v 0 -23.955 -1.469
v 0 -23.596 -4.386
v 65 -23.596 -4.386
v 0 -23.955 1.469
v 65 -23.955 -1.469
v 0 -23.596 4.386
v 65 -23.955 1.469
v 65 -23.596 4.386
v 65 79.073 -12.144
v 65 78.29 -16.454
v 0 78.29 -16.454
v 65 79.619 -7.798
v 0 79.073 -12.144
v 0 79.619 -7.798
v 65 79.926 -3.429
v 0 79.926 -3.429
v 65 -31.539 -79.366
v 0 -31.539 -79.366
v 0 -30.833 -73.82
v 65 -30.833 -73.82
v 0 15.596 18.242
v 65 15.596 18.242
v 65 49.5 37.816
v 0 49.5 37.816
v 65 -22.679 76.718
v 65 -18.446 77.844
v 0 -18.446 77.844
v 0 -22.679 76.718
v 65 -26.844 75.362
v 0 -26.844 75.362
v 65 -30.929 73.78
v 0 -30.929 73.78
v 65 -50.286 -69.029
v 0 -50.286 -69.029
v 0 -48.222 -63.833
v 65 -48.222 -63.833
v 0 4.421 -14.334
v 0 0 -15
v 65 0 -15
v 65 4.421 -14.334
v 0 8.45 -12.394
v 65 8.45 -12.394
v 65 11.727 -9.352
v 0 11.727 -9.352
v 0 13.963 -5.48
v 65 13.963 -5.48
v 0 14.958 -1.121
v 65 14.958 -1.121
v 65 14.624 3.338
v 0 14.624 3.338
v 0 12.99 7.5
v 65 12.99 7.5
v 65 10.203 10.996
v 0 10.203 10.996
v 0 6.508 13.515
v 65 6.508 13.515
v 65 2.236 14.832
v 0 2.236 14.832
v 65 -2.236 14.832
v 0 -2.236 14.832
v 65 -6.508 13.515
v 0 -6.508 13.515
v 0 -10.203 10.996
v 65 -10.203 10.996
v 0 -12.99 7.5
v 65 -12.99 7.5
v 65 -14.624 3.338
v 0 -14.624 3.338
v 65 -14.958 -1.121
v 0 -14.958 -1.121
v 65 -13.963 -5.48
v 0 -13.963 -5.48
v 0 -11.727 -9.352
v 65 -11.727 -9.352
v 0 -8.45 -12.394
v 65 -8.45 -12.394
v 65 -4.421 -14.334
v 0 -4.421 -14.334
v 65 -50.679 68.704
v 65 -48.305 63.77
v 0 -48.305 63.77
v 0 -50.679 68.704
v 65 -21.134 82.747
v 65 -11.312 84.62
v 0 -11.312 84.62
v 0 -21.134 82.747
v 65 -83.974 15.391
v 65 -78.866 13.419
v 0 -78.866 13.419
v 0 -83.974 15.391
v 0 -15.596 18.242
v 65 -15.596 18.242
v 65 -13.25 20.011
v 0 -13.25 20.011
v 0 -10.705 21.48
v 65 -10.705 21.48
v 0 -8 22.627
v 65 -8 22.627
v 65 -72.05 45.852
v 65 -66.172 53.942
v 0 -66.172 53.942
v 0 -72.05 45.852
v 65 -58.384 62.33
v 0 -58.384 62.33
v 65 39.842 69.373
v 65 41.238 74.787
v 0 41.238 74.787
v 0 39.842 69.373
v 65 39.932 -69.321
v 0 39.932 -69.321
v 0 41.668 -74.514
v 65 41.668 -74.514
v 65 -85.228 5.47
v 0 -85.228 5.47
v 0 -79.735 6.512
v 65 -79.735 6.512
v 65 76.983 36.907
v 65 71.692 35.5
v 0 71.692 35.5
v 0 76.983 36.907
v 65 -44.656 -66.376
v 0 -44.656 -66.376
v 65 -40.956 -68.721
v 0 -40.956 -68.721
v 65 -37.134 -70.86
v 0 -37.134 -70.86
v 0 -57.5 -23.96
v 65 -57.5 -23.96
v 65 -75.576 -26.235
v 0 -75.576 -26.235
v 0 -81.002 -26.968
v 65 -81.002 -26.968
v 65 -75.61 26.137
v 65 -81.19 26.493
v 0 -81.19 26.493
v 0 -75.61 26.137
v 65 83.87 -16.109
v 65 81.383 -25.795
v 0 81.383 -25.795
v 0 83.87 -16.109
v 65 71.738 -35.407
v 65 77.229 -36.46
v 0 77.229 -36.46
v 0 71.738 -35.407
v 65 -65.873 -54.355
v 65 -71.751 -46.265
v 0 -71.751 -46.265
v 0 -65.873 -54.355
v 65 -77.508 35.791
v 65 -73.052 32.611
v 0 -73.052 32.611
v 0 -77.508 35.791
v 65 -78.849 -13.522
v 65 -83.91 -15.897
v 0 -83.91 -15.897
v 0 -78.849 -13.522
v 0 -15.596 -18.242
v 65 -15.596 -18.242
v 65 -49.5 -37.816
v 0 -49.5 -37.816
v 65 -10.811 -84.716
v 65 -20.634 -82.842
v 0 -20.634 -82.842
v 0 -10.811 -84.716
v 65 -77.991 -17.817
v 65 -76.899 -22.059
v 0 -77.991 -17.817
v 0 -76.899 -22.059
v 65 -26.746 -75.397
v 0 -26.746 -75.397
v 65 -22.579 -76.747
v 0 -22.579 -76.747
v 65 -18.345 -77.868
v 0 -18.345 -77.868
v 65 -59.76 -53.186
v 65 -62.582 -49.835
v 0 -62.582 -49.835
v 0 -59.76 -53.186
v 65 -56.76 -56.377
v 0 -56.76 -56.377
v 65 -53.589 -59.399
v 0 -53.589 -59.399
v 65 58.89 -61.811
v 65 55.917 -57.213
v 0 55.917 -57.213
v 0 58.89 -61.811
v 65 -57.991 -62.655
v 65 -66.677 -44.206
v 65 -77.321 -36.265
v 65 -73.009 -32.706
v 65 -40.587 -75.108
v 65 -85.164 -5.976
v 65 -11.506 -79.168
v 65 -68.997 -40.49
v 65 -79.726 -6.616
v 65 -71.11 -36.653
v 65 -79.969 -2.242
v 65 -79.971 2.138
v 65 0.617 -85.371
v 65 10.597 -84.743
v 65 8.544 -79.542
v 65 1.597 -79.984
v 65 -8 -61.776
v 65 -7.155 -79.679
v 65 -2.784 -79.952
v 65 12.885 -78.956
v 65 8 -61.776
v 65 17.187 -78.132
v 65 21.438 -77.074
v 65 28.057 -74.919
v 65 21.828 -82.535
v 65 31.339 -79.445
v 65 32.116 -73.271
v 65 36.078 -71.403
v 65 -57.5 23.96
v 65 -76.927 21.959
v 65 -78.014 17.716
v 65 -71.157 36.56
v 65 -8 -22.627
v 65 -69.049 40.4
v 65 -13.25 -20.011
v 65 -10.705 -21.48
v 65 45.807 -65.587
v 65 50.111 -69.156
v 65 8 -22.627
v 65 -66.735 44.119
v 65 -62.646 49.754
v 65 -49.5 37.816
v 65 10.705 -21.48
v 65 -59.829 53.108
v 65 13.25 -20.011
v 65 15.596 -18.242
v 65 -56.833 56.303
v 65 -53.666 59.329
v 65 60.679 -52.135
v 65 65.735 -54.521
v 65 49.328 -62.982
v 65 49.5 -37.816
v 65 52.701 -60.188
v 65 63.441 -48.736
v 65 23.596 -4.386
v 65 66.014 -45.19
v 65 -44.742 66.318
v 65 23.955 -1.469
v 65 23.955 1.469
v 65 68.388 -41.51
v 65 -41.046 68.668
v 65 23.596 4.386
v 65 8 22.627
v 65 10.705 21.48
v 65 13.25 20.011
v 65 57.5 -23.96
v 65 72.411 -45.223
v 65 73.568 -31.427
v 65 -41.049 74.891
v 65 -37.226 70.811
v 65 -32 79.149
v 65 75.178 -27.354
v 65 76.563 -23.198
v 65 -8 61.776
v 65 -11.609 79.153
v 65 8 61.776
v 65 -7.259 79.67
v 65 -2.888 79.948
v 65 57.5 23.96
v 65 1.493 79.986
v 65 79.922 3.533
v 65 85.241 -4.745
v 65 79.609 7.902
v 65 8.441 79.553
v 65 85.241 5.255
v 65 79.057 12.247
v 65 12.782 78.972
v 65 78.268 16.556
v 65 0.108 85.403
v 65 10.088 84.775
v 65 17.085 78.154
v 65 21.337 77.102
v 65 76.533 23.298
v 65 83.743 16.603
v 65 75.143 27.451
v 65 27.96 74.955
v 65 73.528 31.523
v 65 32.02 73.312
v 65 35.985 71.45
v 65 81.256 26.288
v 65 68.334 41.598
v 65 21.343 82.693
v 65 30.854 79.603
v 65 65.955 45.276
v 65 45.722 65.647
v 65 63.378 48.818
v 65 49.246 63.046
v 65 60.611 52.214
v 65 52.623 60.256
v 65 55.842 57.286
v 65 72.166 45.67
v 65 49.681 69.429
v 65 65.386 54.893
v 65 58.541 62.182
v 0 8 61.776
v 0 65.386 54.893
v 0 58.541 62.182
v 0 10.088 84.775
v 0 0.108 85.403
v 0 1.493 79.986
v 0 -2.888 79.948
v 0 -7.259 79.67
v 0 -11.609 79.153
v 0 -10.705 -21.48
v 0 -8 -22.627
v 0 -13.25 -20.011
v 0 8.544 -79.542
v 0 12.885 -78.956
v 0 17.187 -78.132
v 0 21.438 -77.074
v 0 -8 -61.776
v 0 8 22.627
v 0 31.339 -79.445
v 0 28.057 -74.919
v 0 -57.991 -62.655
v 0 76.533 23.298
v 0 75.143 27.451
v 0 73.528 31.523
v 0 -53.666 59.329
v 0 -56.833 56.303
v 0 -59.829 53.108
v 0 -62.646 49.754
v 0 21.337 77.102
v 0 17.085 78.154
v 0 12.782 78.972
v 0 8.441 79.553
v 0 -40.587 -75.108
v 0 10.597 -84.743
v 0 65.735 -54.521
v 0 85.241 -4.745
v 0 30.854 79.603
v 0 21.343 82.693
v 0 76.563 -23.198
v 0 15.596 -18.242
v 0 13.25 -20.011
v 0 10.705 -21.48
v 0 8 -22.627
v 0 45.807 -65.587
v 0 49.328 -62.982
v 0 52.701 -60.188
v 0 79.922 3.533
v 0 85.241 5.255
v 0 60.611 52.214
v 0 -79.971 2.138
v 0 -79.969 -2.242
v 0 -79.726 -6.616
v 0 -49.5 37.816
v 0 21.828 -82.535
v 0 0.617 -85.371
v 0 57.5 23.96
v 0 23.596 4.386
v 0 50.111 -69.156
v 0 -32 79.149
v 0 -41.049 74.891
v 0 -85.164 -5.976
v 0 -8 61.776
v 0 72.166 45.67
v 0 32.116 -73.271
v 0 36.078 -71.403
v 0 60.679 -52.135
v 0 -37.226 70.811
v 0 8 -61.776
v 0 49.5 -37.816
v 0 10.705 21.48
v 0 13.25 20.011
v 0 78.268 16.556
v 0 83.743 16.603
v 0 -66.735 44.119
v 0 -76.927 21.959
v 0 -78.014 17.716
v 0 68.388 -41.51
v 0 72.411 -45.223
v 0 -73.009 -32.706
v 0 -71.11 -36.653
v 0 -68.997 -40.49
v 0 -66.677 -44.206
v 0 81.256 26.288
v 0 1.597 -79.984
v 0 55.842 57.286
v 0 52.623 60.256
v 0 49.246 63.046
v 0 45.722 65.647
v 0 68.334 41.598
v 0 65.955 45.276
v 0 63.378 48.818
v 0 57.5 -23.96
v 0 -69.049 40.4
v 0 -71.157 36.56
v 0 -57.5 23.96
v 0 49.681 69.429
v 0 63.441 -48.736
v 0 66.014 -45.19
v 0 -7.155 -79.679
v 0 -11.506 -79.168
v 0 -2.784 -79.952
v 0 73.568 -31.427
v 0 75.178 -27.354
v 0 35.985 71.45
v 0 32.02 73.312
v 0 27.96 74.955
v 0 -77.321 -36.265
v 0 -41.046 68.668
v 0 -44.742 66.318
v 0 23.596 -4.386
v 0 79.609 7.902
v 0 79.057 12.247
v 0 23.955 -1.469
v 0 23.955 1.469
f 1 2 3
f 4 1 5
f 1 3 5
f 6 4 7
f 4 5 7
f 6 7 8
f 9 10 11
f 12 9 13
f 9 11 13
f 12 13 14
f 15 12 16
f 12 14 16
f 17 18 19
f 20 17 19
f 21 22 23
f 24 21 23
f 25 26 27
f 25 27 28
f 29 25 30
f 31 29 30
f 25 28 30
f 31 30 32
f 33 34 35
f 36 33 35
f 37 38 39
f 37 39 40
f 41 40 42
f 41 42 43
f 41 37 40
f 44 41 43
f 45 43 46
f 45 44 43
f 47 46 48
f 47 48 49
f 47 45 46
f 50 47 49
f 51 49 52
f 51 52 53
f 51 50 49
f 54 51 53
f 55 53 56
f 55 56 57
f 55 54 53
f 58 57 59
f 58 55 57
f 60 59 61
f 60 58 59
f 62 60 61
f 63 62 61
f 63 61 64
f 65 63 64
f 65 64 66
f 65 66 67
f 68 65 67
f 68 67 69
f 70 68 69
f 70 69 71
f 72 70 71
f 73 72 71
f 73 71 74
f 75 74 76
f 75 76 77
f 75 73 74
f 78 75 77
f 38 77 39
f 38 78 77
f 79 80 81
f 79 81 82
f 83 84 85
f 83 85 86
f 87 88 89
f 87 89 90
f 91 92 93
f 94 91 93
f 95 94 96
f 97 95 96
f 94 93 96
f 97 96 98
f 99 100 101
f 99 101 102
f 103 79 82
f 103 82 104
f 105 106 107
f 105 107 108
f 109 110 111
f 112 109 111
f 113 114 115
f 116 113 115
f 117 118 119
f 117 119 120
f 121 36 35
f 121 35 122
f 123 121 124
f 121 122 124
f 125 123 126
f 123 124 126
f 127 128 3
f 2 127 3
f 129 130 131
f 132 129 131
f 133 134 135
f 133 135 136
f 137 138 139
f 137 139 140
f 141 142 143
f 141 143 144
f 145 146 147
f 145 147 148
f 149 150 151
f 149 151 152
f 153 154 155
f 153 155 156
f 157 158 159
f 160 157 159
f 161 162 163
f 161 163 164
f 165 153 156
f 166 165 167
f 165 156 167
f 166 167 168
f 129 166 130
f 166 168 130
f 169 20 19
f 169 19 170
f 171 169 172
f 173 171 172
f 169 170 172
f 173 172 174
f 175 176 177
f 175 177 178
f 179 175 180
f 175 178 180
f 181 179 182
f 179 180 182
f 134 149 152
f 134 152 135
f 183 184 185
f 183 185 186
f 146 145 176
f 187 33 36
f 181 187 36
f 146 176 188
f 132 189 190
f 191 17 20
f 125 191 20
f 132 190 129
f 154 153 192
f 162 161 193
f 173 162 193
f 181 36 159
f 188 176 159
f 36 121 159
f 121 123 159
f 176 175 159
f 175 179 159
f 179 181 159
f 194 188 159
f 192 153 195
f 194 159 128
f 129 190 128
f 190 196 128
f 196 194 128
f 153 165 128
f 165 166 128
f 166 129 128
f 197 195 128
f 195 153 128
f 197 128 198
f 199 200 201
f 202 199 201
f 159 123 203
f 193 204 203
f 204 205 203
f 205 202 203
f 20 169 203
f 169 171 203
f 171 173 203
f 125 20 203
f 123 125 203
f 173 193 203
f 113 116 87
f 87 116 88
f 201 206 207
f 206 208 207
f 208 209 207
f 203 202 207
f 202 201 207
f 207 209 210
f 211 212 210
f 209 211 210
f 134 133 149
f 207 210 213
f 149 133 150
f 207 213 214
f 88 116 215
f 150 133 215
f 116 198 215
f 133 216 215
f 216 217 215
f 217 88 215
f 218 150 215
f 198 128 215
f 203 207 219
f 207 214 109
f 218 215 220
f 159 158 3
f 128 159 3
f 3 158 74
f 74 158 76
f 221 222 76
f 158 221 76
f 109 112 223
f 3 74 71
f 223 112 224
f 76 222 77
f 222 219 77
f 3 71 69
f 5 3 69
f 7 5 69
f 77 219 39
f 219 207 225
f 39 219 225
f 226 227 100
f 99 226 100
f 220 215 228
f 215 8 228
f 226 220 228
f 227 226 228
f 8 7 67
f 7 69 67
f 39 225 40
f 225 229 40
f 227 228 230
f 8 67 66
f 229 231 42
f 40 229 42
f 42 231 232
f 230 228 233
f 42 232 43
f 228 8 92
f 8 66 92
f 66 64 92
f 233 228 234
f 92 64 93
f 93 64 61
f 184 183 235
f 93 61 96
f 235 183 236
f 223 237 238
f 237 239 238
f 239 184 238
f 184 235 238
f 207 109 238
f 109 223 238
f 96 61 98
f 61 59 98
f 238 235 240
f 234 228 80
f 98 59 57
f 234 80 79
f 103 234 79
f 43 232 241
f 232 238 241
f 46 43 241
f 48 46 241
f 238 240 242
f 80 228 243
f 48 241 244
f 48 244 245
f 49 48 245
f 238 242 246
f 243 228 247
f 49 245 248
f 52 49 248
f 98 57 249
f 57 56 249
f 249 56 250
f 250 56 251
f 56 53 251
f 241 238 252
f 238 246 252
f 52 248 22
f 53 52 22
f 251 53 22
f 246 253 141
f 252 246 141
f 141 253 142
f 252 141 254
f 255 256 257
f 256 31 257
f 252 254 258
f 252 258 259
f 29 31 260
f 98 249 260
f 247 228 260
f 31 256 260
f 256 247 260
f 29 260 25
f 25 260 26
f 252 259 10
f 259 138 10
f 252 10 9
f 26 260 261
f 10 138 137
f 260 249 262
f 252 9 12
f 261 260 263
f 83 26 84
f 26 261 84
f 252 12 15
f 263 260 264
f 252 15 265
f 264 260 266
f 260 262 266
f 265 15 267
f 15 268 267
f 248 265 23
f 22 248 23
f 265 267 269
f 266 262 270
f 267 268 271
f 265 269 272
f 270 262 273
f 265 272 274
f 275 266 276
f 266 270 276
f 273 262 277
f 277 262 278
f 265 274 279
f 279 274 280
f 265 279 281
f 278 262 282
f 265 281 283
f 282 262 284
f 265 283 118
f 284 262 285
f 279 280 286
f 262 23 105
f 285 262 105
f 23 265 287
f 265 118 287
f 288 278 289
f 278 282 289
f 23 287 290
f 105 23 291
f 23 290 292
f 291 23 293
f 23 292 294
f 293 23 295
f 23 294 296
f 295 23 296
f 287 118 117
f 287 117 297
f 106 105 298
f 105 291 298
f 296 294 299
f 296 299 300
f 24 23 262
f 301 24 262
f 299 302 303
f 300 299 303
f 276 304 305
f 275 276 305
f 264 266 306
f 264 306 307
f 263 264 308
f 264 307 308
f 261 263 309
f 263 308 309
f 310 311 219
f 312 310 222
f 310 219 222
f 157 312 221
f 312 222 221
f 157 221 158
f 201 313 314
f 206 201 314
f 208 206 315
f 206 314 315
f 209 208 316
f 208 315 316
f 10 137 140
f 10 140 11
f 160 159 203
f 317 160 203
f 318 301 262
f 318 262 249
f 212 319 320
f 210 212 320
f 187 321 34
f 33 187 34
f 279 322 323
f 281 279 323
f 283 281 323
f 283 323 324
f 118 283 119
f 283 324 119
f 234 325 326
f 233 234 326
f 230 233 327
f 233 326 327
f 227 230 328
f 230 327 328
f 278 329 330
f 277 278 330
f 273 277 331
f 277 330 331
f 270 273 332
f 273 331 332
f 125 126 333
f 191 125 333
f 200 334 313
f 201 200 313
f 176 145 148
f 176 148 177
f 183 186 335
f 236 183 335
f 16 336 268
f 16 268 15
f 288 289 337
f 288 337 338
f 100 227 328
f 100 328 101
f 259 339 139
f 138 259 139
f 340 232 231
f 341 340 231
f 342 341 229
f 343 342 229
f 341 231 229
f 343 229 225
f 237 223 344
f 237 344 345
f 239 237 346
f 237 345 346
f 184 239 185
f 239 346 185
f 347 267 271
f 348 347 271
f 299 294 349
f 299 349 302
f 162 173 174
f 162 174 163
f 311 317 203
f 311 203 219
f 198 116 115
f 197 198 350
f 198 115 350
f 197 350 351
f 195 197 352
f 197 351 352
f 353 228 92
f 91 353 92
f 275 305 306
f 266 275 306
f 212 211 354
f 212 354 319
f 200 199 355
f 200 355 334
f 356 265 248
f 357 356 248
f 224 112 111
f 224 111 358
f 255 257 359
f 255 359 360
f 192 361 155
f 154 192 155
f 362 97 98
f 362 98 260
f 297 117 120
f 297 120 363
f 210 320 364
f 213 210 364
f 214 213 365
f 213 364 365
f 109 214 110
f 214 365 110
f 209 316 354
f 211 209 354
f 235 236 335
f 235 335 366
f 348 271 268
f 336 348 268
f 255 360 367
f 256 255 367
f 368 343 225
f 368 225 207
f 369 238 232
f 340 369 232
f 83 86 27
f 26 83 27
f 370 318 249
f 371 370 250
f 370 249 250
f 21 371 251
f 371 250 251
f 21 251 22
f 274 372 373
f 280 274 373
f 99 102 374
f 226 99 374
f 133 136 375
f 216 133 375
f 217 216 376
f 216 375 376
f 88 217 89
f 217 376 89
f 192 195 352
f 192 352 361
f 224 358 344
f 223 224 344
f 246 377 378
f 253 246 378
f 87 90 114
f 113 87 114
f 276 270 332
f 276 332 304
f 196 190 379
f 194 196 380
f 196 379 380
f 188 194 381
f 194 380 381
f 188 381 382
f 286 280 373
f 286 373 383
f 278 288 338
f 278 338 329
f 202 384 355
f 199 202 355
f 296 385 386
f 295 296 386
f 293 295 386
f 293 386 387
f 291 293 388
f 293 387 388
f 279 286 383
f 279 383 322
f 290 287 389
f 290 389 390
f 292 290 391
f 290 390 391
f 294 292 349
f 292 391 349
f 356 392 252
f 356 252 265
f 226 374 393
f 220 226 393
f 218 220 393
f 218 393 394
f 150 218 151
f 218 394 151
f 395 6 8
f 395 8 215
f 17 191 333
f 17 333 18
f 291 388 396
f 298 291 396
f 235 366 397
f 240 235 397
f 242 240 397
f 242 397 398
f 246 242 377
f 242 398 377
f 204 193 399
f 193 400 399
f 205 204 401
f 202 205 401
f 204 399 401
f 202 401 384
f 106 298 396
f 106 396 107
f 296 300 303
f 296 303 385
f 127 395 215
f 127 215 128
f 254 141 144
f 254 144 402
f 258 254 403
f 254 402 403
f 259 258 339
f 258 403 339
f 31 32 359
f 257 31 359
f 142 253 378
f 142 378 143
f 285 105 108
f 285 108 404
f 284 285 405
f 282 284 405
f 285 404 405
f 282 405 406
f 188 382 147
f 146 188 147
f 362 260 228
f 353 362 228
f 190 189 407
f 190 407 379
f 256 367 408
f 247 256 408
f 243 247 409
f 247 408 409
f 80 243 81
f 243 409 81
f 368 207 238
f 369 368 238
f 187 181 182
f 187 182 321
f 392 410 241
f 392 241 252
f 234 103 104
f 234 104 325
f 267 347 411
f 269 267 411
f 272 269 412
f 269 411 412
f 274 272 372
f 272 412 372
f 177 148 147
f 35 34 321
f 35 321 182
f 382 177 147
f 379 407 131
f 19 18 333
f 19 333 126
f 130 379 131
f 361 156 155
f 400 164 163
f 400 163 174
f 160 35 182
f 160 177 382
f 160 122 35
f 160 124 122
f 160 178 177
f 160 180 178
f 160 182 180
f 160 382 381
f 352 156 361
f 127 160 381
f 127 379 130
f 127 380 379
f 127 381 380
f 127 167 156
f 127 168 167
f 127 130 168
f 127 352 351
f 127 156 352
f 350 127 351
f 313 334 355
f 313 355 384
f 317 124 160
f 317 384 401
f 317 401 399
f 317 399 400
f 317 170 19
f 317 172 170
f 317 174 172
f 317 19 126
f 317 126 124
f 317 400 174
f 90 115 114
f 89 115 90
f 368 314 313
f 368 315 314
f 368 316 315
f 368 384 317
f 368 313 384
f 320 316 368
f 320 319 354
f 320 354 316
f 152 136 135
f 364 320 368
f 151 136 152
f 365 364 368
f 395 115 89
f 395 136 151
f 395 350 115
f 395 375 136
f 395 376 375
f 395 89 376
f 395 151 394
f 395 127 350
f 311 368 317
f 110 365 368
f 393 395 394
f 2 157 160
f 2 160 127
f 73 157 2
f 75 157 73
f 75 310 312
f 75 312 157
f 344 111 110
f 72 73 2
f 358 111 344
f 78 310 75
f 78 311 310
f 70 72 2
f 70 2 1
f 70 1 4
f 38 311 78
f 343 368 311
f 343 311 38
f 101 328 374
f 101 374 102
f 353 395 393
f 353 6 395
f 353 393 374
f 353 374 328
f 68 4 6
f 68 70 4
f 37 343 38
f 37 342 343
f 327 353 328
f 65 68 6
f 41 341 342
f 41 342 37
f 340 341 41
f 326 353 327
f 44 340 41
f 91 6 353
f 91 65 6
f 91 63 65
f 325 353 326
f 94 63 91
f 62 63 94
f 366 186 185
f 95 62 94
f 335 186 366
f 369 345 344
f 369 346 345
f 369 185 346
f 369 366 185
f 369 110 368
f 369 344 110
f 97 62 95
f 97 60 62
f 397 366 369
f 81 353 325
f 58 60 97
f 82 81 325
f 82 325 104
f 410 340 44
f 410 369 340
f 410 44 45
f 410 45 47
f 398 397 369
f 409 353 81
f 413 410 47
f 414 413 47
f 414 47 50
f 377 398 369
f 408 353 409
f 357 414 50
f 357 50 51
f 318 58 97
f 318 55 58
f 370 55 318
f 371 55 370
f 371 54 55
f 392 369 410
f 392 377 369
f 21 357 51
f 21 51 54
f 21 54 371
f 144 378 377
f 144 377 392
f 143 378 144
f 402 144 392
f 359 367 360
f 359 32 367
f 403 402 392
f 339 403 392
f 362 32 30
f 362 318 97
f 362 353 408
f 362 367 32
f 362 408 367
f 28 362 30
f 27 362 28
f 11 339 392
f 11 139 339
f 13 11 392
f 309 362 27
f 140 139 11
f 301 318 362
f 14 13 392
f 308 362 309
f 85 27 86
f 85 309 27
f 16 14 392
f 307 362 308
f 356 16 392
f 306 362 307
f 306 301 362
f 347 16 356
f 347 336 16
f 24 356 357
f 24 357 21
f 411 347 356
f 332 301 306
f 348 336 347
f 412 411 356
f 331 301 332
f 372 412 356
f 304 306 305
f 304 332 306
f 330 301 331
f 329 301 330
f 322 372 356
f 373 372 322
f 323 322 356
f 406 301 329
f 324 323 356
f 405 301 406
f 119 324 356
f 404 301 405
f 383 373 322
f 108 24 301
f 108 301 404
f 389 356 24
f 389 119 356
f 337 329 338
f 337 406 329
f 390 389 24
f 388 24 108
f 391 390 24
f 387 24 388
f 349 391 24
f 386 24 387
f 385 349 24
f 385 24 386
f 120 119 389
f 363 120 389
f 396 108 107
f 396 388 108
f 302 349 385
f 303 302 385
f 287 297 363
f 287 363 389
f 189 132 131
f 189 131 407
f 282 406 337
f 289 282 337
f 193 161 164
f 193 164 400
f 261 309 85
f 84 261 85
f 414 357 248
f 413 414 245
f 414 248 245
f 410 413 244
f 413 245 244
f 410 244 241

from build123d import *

# Parameters (mm, degrees)
SKETCH1_R           = 80
SKETCH1_R_2         = 15
BOSS_EXTRUDE1_DEPTH = 65
CUT_EXTRUDE1_DEPTH  = 65
BOSS_EXTRUDE2_DEPTH = 65


with BuildPart() as part:
    # Sketch1 → Boss-Extrude1 (new body)
    with BuildSketch(Plane(origin=(0, 0, 0), x_dir=(0, 0, -1), z_dir=(1, 0, 0))):
        Circle(SKETCH1_R)
        Circle(SKETCH1_R_2, mode=Mode.SUBTRACT)
    extrude(amount=BOSS_EXTRUDE1_DEPTH)

    # Sketch2 → Cut-Extrude1 (cut)
    with BuildSketch(Plane(origin=(65, 0, 0), x_dir=(0, 0, -1), z_dir=(1, 0, 0))):
        with BuildLine():
            Line((-37.816442632, 49.5), (-61.776478803, 8))
            Line((-61.776478803, 8), (-22.627416998, 8))
            ThreePointArc((-22.627416998, 8), (-20.784609691, 12), (-18.241911729, 15.595917942))
            Line((-18.241911729, 15.595917942), (-37.816442632, 49.5))
        make_face()
        with BuildLine():
            Line((-61.776478803, -8), (-37.816442632, -49.5))
            Line((-37.816442632, -49.5), (-18.241911729, -15.595917942))
            ThreePointArc((-18.241911729, -15.595917942), (-20.784609691, -12), (-22.627416998, -8))
            Line((-22.627416998, -8), (-61.776478803, -8))
        make_face()
        with BuildLine():
            Line((-4.385505269, -23.595917942), (-23.960036171, -57.5))
            Line((-23.960036171, -57.5), (23.960036171, -57.5))
            Line((23.960036171, -57.5), (4.385505269, -23.595917942))
            ThreePointArc((4.385505269, -23.595917942), (0, -24), (-4.385505269, -23.595917942))
        make_face()
        with BuildLine():
            Line((18.241911729, -15.595917942), (37.816442632, -49.5))
            Line((37.816442632, -49.5), (61.776478803, -8))
            Line((61.776478803, -8), (22.627416998, -8))
            ThreePointArc((22.627416998, -8), (20.784609691, -12), (18.241911729, -15.595917942))
        make_face()
        with BuildLine():
            Line((22.627416998, 8), (61.776478803, 8))
            Line((61.776478803, 8), (37.816442632, 49.5))
            Line((37.816442632, 49.5), (18.241911729, 15.595917942))
            ThreePointArc((18.241911729, 15.595917942), (20.784609691, 12), (22.627416998, 8))
        make_face()
        with BuildLine():
            Line((23.960036171, 57.5), (-23.960036171, 57.5))
            Line((-23.960036171, 57.5), (-4.385505269, 23.595917942))
            ThreePointArc((-4.385505269, 23.595917942), (0, 24), (4.385505269, 23.595917942))
            Line((4.385505269, 23.595917942), (23.960036171, 57.5))
        make_face()
    extrude(amount=-CUT_EXTRUDE1_DEPTH, mode=Mode.SUBTRACT)

    # Sketch3 → Boss-Extrude2 (add)
    with BuildSketch(Plane(origin=(65, 0, 0), x_dir=(0, 0, -1), z_dir=(1, 0, 0))):
        Polygon((-5.254935121, 85.241193332), (4.745064879, 85.241193332), (3.011443405, 78.241193332), (-2.988556595, 78.241193332), align=None)
        Polygon((22.374626914, 75.034186847), (25.794612692, 81.383134846), (16.108781081, 83.870033718), (16.563127947, 76.52632617), align=None)
        Polygon((40.331930326, 67.112506447), (45.223390123, 72.411474692), (36.460323323, 77.229011433), (35.074090246, 70.003028491), align=None)
        Polygon((55.755030225, 54.973900443), (61.810615633, 58.889935272), (54.520929359, 65.735406331), (51.381218461, 59.081183079), align=None)
        Polygon((67.674836523, 39.381082095), (74.514052839, 41.668124637), (69.15578489, 50.111403892), (64.459875753, 44.447049648), align=None)
        Polygon((75.342383951, 21.313805526), (82.535498062, 21.828152487), (79.445328118, 31.338717649), (73.488281984, 27.020144624), align=None)
        Polygon((78.275892305, 1.907304169), (85.370934397, 0.616637237), (84.743029202, 10.596904521), (77.899149188, 7.895464539), align=None)
        Polygon((76.291038468, -17.619040124), (82.842200952, -20.633623598), (84.716014098, -10.810751091), (77.415326355, -11.72531662), align=None)
        Polygon((69.512538104, -36.038315328), (75.108187348, -40.587397978), (79.365980264, -31.539127453), (72.067213854, -30.609353013), align=None)
        Polygon((58.366309323, -52.19317064), (62.654850105, -57.990916872), (69.029090003, -50.285784444), (62.190853261, -47.570091183), align=None)
        Polygon((43.55271067, -65.068537087), (46.264678201, -71.750653184), (54.354848145, -65.872800661), (48.406812636, -61.541825573), align=None)
        Polygon((26.00253503, -73.855408044), (26.967526417, -81.002032075), (36.265291276, -77.320786548), (31.581193946, -71.646660728), align=None)
        Polygon((6.818524484, -78.001672092), (5.975905768, -85.163755387), (15.897052781, -83.910423051), (12.771212692, -77.249672691), align=None)
        Polygon((-12.793919032, -77.246804213), (-15.391203019, -83.974326737), (-5.470056006, -85.227659073), (-6.841230825, -77.998803615), align=None)
        Polygon((-31.602473563, -71.638235531), (-35.791225914, -77.508482303), (-26.493461056, -81.18972783), (-26.023814648, -73.846982847), align=None)
        Polygon((-48.425328454, -61.528373044), (-53.942354455, -66.172494869), (-45.852184511, -72.050347392), (-43.571226488, -65.055084558), align=None)
        Polygon((-62.205441863, -47.552456593), (-68.704086479, -50.678646217), (-62.329846582, -58.383778645), (-58.380897924, -52.175536049), align=None)
        Polygon((-72.076958583, -30.588644408), (-79.148888074, -32.00047184), (-74.891095158, -41.048742365), (-69.522282834, -36.017606723), align=None)
        Polygon((-77.419614916, -11.702835198), (-84.620473942, -11.311590128), (-82.746660796, -21.134462636), (-76.295327028, -17.596558703), align=None)
        Polygon((-77.897712113, 7.918306187), (-84.775044219, 10.088040392), (-85.402949415, 0.107773108), (-78.27445523, 1.930145817), align=None)
        Polygon((-73.481209571, 27.041911273), (-79.602886688, 30.853802234), (-82.693056632, 21.343237071), (-75.335311537, 21.335572176), align=None)
        Polygon((-64.447612387, 44.466373621), (-69.428987027, 49.680906209), (-74.787254977, 41.237626954), (-67.662573157, 39.400406068), align=None)
        Polygon((-51.364534694, 59.096850178), (-54.892608769, 65.386376133), (-62.182295043, 58.540905074), (-55.738346459, 54.989567543), align=None)
        Polygon((-35.054034381, 70.014054296), (-36.907126021, 76.983379571), (-45.670192822, 72.16584283), (-40.311874462, 67.123532251), align=None)
        Polygon((-16.540960169, 76.532017888), (-16.602632811, 83.743234145), (-26.288464422, 81.256335273), (-22.352459135, 75.039878565), align=None)
    extrude(amount=-BOSS_EXTRUDE2_DEPTH)


solid = part.part
